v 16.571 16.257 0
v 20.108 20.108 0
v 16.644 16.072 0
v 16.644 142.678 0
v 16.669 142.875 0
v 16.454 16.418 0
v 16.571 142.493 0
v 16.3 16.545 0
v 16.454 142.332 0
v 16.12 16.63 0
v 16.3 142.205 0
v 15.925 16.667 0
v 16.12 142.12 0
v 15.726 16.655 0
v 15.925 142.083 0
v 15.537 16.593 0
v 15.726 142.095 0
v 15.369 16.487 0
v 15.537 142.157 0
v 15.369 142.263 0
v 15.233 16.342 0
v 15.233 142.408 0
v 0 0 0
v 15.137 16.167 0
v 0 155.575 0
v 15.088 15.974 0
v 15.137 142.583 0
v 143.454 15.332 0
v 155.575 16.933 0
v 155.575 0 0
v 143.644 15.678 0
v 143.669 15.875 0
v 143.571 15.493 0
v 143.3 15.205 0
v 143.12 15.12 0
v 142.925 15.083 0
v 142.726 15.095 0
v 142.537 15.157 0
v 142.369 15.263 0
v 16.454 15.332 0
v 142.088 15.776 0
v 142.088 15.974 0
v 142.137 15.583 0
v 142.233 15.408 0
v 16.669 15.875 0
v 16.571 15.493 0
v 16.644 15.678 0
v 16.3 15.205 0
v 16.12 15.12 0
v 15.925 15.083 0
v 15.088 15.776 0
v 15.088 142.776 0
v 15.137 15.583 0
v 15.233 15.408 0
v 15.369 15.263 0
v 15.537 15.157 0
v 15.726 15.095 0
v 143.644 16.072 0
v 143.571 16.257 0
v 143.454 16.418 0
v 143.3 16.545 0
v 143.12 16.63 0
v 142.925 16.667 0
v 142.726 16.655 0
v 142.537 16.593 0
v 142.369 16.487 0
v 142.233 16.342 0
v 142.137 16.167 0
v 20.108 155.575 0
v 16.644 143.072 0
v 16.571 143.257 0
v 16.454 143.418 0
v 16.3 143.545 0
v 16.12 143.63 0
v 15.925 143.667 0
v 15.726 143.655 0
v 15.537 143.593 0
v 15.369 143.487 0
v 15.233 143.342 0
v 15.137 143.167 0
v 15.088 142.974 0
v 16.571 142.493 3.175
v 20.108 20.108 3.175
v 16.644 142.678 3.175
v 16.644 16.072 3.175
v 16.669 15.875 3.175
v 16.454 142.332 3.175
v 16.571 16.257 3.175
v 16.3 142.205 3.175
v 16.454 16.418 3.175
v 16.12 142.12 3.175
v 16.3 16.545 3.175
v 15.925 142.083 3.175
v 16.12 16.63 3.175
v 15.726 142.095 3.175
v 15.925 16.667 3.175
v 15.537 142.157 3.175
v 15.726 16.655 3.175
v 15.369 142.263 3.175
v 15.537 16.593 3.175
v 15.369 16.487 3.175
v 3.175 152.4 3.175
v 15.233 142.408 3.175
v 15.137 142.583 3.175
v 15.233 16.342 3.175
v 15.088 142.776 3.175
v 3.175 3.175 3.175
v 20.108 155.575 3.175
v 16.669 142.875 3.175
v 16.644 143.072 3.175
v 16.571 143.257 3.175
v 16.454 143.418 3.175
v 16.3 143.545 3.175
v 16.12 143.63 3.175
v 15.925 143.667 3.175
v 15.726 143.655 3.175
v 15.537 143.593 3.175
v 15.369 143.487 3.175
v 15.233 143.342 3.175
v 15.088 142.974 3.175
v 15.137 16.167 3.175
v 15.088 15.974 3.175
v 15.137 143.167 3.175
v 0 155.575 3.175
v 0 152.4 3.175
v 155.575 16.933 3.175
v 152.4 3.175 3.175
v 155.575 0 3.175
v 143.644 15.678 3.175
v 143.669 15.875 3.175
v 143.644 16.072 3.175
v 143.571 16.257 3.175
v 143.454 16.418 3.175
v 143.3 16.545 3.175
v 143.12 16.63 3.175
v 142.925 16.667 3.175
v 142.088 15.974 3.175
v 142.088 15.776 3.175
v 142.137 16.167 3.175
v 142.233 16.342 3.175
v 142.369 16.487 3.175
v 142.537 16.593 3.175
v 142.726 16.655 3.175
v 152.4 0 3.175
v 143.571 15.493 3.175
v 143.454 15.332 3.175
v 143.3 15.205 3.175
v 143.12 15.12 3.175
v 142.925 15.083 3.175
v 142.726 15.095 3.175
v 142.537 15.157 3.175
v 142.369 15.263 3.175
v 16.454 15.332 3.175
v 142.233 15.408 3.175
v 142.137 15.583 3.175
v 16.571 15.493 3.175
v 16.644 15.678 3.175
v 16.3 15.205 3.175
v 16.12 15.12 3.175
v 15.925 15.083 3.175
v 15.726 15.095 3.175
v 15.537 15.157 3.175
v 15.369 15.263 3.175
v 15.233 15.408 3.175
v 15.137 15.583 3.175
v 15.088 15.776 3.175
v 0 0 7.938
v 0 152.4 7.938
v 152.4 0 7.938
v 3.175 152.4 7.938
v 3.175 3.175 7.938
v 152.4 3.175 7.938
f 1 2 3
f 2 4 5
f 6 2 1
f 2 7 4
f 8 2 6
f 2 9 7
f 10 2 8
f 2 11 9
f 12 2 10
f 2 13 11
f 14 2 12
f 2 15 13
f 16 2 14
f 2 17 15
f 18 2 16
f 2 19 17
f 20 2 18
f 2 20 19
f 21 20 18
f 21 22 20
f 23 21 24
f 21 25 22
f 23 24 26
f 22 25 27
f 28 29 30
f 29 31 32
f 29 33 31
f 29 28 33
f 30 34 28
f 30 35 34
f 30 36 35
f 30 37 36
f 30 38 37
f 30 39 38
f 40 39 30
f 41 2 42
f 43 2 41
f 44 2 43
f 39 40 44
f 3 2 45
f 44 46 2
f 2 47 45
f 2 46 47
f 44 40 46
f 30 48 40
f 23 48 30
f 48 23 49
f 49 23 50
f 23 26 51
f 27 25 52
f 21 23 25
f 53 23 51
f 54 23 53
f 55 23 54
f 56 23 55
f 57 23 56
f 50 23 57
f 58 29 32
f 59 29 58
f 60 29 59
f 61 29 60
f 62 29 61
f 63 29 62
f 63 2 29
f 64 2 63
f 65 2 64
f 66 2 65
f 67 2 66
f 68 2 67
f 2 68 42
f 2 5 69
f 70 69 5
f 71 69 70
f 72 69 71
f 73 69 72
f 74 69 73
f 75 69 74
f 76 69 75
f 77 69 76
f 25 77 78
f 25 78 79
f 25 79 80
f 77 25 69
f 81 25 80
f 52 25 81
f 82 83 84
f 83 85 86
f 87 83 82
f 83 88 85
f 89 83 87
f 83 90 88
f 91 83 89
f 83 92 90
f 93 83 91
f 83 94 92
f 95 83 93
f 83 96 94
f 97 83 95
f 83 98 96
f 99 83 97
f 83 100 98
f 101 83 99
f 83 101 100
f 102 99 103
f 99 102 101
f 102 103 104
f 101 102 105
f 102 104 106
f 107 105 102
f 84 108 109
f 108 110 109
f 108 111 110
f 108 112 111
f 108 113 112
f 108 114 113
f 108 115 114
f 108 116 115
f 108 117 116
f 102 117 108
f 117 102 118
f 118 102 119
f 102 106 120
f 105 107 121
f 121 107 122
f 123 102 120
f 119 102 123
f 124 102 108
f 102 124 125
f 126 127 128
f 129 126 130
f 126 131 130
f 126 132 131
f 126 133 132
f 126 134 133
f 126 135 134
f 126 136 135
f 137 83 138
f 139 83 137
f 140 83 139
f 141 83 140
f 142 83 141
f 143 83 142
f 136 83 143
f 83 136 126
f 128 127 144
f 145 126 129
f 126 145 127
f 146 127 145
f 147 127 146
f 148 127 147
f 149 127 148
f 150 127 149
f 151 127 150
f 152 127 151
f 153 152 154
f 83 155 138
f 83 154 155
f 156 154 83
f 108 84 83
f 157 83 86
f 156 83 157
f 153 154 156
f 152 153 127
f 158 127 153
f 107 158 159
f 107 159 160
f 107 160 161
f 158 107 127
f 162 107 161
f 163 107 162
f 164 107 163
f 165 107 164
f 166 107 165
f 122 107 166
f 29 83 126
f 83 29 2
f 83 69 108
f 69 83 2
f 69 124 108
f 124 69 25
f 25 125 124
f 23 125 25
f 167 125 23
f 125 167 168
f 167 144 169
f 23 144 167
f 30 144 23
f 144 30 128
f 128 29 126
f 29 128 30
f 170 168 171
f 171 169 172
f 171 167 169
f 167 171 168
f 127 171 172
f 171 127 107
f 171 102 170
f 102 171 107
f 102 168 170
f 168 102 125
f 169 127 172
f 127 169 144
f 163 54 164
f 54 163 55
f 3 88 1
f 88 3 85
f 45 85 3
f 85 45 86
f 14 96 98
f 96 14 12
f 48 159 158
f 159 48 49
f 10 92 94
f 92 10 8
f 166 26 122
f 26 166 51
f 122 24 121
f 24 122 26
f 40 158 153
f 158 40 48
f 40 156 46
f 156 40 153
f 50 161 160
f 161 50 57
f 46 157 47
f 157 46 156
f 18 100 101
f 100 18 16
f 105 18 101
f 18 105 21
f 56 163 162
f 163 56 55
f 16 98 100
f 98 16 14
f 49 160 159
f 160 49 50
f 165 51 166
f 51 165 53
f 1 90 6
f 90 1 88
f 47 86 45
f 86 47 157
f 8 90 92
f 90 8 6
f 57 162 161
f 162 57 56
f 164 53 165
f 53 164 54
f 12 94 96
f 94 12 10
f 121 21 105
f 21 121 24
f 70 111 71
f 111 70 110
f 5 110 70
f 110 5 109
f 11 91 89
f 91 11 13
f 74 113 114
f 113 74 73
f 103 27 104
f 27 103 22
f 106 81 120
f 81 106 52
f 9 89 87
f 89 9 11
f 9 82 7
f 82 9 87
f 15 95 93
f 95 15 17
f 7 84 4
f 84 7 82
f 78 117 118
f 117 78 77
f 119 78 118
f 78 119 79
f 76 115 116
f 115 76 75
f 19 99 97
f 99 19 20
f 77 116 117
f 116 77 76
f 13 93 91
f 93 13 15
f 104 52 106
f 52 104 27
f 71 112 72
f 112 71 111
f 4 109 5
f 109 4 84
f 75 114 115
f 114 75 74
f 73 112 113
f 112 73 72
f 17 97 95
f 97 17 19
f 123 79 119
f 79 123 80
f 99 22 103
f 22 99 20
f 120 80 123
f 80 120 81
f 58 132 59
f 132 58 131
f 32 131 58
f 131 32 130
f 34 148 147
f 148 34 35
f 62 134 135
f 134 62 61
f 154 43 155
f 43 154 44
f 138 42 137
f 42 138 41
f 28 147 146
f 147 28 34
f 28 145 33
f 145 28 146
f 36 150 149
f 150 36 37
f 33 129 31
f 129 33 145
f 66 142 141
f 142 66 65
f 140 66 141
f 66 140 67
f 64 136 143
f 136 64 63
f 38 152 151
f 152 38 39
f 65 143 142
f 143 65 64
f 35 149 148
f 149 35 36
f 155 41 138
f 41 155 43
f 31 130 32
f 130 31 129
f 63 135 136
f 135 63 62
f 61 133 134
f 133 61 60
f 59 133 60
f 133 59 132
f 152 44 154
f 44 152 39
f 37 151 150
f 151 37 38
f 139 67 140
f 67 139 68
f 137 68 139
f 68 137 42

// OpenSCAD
$fn = 25;

multiplier = 25.4;

side = 6 * multiplier;
holeDiameter = 0.0625 * multiplier ; // 1/16 inch
holeOffSet = 1 * multiplier;
egedAllowance = holeOffSet / 2;

faceDepth = 0.125 * multiplier;
faceWidth = holeOffSet * 2/3;
lipDepth = faceDepth * 2.5;
lipWidth = 0.125 * multiplier;
holeHeight = faceDepth * 2;

module corner(depth, p, w) {

    linear_extrude(depth) {
        polygon(points=
        [
            [0,0],
            [p + side,0],
            [p + side,w],
            [p + w,p + w],
            [p + w,p +side],
            [0,p +side]
            ]);
    }
}

difference() {
    
union() {
    corner(faceDepth, lipWidth, faceWidth);
    corner(lipDepth, 0, lipWidth);
}

    theHole(lipWidth + egedAllowance, lipWidth + egedAllowance);
    theHole(lipWidth + egedAllowance, lipWidth + side - egedAllowance);
    theHole(lipWidth + side - egedAllowance, lipWidth + egedAllowance);

}

module theHole(x,y) {
    translate([x, y, holeHeight / 4]) 
    cylinder(d=holeDiameter, h=holeHeight, center=true);
}
